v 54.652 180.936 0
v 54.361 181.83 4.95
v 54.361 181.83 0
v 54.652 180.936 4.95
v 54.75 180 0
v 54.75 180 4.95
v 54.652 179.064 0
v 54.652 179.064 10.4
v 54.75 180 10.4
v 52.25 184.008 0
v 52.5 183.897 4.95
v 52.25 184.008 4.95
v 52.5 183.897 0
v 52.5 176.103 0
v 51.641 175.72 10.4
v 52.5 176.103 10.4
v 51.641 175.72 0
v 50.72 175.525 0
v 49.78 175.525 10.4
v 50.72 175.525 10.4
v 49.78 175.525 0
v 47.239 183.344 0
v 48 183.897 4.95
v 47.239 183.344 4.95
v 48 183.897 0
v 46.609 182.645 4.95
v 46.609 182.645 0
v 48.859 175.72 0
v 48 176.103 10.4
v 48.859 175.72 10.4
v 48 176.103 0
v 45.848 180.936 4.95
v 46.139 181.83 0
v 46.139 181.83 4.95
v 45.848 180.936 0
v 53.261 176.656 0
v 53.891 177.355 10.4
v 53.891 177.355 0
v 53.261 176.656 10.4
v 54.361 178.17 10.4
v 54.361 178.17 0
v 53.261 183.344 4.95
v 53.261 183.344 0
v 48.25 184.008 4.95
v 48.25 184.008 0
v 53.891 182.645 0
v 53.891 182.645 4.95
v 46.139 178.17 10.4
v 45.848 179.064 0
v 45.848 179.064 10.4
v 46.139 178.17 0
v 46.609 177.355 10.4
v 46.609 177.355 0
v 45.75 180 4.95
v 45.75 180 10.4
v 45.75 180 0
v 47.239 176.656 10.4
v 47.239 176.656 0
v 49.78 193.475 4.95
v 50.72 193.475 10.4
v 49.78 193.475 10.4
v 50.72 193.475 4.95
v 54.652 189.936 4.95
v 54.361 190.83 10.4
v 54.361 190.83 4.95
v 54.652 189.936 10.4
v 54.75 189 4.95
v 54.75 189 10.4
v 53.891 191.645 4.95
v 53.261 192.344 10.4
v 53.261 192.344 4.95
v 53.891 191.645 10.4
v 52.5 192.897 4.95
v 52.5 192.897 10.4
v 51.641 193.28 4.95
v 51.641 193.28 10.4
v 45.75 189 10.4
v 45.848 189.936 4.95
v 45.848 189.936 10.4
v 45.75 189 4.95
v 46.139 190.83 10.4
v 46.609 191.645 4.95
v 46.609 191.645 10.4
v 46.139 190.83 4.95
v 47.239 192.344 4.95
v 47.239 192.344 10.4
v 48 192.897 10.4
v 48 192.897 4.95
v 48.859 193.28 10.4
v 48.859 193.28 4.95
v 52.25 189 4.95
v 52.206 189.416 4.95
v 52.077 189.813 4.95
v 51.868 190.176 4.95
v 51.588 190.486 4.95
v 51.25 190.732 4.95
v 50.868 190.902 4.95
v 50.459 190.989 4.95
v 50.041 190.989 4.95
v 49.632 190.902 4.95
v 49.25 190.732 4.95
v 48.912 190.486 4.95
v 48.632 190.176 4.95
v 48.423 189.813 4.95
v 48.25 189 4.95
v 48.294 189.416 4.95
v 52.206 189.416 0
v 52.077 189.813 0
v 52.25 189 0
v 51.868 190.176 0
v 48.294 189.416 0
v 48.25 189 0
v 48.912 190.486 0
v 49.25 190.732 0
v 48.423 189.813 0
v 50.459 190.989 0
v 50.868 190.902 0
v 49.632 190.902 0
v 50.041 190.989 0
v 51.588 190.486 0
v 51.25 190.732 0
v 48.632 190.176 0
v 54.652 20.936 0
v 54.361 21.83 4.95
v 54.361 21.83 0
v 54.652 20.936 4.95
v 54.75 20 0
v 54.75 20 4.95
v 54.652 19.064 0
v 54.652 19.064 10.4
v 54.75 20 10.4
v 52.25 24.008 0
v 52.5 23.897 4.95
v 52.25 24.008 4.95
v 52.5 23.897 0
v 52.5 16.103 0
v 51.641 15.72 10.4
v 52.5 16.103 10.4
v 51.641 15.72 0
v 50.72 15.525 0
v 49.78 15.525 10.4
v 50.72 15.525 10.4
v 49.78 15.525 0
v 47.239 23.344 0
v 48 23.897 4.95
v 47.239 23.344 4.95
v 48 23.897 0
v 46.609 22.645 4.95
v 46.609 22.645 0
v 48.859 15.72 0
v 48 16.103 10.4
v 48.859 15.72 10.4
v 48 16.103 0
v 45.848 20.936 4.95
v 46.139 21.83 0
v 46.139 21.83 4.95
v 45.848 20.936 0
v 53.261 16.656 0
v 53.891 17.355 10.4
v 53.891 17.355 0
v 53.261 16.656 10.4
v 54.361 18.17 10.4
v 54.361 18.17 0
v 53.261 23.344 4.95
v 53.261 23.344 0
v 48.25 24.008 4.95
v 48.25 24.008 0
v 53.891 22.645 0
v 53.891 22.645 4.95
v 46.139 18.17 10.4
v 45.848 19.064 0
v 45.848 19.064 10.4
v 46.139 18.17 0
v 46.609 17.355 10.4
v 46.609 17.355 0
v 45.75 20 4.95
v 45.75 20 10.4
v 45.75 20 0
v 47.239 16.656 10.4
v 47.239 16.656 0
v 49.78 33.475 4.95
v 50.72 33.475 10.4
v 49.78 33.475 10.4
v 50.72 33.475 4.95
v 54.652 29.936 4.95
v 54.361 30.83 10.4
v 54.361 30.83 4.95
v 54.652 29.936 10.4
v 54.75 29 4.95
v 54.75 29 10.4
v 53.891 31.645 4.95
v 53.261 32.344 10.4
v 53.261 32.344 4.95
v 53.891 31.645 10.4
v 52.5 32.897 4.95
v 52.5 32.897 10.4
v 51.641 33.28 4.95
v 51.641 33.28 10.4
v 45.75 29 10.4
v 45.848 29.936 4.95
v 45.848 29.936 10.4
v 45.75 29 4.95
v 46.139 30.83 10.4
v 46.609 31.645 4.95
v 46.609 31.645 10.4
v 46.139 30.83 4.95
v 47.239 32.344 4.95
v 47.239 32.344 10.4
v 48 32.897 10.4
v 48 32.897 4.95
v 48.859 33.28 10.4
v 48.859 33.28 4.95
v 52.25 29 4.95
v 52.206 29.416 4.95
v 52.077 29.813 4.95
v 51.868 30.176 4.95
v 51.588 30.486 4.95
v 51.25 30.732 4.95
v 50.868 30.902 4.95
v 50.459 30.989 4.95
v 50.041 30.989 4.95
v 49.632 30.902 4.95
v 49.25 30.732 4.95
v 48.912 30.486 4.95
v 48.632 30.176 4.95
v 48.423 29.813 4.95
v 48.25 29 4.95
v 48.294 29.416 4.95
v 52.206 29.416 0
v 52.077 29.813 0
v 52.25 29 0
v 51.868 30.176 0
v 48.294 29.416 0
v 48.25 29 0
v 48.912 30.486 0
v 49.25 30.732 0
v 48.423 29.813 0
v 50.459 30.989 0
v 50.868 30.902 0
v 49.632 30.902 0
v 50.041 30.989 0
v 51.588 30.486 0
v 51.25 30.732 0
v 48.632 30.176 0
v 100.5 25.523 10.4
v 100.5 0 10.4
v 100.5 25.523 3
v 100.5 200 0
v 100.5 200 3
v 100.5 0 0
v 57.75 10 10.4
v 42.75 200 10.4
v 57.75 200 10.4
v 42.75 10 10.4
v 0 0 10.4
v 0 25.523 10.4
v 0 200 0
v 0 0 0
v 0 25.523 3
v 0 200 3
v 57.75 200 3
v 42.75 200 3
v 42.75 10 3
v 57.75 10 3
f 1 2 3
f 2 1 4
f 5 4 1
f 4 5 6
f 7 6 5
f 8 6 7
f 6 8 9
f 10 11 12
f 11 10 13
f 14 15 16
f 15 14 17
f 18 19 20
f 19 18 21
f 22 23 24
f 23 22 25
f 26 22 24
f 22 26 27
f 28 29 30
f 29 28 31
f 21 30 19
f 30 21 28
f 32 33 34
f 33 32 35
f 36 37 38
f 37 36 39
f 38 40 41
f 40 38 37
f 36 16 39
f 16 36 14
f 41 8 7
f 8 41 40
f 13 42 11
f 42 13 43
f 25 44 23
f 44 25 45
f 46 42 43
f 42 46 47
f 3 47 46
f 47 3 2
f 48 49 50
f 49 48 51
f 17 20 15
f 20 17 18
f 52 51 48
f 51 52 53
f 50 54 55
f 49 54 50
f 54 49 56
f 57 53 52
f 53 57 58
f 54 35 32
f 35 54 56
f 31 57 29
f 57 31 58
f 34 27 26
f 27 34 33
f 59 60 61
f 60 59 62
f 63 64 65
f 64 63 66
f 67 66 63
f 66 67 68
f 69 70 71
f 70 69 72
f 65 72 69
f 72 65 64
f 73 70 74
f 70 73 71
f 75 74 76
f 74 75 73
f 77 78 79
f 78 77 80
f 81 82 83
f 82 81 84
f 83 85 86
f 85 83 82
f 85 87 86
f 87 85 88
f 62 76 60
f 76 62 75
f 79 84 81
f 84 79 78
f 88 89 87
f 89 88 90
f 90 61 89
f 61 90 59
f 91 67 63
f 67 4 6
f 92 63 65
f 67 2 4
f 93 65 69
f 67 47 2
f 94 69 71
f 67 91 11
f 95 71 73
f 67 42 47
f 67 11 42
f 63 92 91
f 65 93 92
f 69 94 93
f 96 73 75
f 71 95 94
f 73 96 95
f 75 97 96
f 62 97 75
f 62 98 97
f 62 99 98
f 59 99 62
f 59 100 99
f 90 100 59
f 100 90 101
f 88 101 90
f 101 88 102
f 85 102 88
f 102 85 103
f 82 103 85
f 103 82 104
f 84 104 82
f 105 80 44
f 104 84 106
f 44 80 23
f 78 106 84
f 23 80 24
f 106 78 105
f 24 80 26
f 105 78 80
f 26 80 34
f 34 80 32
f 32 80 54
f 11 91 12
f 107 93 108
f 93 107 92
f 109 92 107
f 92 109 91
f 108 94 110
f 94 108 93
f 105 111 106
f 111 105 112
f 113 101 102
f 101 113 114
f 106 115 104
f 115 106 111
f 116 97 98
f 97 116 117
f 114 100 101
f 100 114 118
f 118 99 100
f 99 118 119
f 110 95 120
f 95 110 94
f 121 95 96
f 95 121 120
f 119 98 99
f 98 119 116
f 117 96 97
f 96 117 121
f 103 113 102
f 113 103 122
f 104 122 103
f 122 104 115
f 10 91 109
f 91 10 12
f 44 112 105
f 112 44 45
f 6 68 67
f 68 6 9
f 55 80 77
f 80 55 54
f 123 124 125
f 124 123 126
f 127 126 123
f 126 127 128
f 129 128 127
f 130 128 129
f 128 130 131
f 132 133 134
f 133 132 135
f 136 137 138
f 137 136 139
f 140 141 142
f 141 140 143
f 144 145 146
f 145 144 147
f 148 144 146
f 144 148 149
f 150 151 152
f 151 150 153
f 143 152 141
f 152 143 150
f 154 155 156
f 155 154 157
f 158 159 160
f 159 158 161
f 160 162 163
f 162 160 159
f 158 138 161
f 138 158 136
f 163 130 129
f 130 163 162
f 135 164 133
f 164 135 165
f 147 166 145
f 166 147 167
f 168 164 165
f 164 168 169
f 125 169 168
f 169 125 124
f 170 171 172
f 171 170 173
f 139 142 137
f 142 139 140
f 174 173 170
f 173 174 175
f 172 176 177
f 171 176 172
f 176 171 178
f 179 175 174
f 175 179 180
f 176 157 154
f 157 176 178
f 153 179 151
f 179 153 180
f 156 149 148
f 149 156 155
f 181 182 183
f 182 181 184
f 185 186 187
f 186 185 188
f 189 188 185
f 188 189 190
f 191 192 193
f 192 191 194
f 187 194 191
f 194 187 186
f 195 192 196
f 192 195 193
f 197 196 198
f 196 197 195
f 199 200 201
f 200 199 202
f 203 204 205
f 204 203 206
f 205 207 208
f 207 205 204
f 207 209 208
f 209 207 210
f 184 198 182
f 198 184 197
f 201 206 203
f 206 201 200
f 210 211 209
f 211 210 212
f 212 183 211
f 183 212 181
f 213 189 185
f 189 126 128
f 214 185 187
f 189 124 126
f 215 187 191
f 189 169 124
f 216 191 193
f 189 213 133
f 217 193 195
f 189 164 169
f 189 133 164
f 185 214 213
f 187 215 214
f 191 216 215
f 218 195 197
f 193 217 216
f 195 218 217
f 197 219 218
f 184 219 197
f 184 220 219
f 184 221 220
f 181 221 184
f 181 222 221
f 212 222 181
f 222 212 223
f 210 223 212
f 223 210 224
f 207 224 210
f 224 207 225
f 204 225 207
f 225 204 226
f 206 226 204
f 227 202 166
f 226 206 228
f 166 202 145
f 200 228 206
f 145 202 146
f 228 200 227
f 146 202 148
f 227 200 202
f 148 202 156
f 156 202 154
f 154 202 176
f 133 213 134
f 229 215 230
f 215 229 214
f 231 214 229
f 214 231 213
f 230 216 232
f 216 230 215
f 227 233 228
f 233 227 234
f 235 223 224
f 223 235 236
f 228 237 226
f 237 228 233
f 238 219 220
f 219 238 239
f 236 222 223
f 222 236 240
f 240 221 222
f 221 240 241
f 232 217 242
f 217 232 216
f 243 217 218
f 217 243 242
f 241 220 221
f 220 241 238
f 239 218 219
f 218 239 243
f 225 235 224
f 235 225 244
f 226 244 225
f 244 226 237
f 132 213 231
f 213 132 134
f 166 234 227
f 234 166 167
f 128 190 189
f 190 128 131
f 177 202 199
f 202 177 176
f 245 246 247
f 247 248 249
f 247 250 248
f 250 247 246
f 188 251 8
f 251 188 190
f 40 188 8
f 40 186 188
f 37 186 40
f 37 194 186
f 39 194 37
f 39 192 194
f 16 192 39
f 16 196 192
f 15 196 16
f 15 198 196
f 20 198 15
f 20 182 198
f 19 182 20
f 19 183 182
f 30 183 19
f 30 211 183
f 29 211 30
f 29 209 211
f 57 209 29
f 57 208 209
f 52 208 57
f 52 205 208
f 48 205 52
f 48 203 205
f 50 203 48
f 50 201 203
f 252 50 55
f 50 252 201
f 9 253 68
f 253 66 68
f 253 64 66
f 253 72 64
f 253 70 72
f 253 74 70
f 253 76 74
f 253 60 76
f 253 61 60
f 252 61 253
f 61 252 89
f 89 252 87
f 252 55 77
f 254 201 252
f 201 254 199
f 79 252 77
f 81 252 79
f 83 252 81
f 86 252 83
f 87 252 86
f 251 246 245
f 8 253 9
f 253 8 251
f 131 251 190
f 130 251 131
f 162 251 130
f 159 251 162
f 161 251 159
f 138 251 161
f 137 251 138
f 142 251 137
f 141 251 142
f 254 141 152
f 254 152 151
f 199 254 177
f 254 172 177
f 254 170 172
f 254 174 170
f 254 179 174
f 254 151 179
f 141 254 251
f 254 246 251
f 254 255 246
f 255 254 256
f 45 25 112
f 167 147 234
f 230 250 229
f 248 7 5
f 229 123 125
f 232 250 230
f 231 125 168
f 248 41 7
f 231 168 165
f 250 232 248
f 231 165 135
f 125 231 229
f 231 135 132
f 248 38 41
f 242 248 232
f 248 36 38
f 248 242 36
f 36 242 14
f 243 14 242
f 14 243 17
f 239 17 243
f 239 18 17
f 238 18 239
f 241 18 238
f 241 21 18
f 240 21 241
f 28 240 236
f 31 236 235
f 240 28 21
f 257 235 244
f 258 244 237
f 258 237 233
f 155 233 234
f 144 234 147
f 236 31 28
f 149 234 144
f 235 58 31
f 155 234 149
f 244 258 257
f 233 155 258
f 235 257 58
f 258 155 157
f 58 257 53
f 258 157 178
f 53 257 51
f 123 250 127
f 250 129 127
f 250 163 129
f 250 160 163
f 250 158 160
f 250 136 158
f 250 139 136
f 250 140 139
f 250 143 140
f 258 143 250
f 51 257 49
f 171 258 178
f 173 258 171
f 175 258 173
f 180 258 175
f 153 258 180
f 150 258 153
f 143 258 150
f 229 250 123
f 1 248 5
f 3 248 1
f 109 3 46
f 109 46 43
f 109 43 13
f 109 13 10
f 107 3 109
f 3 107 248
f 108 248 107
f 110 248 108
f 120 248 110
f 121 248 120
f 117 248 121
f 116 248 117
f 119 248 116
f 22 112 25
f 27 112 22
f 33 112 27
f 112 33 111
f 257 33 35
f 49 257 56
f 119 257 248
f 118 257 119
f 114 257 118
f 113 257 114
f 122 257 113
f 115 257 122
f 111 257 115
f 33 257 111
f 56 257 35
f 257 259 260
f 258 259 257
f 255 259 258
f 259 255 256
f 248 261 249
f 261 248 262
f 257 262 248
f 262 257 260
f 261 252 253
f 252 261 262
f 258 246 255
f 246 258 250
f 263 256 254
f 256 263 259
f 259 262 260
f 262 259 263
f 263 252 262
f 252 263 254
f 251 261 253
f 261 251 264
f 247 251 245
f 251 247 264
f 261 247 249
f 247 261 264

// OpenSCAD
// AA Battery Dispenser
// First in First out

EPS=0.01;
$fs=0.2;

// AA Battery
AADiameter=14.3;
AALength=51;
Gap=0.5;

// Two Boards needes for assembly
BoardThickness=10.4;
BoardWidth=100.5;
BoardHeight=200;
BoardMiddleWidth=15;

PocketEdge=(BoardWidth-BoardMiddleWidth)/2;
RestBoardWidth=BoardThickness-AADiameter/2-Gap/2;
BatAngle=20;
BottomEdge=10;

screwDia=4;
screwHead=screwDia+5;

// Colors
Aluminum = [0.77, 0.77, 0.8];
BlackPaint = [0.2, 0.2, 0.2];
BrightYellow = [1, 1, 0];
Transparent = [0.3, 0.3, 1, 0.8];

module pocket() {
  h=PocketEdge*tan(BatAngle);
  linear_extrude(height = BoardThickness, center = false, convexity = 10, twist = 0)
  polygon(points=[[-10*EPS,BottomEdge+h],[PocketEdge,BottomEdge],[PocketEdge,BoardHeight+10*EPS]
		 ,[-10*EPS, BoardHeight+10*EPS]],
          	  paths=[[0,1,2,3]]);
}

module screwHole() {
  union() {
    cylinder(h = 20, r=screwHead/2);
    translate([0,9,5]) cylinder(h=20, r=screwHead/2);
    translate([0,9,0]) cylinder(h=20, r=screwDia/2);
    translate([-screwDia/2,0,0]) cube(size=[screwDia,9,20]);
    translate([-screwHead/2,0,5]) cube(size=[screwHead,9,20]);
  }
}

module back() {
  difference() {
    cube(size=[BoardWidth,BoardHeight,BoardThickness]);
    translate([0,0,RestBoardWidth]) pocket();
    translate([2*PocketEdge+BoardMiddleWidth,0,BoardThickness+RestBoardWidth])
		rotate(a=[0,180,0]) pocket();
    translate([PocketEdge+BoardMiddleWidth/2,BoardHeight-20,-EPS*5]) screwHole();
    translate([PocketEdge+BoardMiddleWidth/2,20,-EPS*5]) screwHole();
  }
}

module front() {
  difference() {
    cube(size=[BoardWidth,BoardHeight,BoardThickness]);
    translate([0,0,RestBoardWidth]) pocket();
    translate([2*PocketEdge+BoardMiddleWidth,0,BoardThickness+RestBoardWidth])
		rotate(a=[0,180,0]) pocket();
  }
}

module battery(){
  h=PocketEdge*tan(BatAngle);
  r=AADiameter/2;
  translate([-BoardMiddleWidth,h+BottomEdge+r*2,RestBoardWidth+r]) rotate(a=[0,90,-BatAngle])
    color(Aluminum) cylinder(h=AALength, r=AADiameter/2, $fs=RoundAccuracy);
}

module all() {
    back();
    //front();
    //battery();
    //translate([BoardWidth+10,0,0]) back();
}


// 2D Oben für DXF Export
module oben2D() {
  projection(cut=true) translate([0,0,-9]) all();
  //projection(cut=true) translate([0,0,-4]) all();
  //projection(cut=true) translate([0,0,-2]) all();
}

module seite2D() {
  //projection(cut=true) translate([0,0,9]) rotate(a=[0,90,0]) all();
  projection(cut=true) translate([0,0,BoardWidth/2]) rotate(a=[0,90,0]) all();
}

//oben2D();
all();
//seite2D();
